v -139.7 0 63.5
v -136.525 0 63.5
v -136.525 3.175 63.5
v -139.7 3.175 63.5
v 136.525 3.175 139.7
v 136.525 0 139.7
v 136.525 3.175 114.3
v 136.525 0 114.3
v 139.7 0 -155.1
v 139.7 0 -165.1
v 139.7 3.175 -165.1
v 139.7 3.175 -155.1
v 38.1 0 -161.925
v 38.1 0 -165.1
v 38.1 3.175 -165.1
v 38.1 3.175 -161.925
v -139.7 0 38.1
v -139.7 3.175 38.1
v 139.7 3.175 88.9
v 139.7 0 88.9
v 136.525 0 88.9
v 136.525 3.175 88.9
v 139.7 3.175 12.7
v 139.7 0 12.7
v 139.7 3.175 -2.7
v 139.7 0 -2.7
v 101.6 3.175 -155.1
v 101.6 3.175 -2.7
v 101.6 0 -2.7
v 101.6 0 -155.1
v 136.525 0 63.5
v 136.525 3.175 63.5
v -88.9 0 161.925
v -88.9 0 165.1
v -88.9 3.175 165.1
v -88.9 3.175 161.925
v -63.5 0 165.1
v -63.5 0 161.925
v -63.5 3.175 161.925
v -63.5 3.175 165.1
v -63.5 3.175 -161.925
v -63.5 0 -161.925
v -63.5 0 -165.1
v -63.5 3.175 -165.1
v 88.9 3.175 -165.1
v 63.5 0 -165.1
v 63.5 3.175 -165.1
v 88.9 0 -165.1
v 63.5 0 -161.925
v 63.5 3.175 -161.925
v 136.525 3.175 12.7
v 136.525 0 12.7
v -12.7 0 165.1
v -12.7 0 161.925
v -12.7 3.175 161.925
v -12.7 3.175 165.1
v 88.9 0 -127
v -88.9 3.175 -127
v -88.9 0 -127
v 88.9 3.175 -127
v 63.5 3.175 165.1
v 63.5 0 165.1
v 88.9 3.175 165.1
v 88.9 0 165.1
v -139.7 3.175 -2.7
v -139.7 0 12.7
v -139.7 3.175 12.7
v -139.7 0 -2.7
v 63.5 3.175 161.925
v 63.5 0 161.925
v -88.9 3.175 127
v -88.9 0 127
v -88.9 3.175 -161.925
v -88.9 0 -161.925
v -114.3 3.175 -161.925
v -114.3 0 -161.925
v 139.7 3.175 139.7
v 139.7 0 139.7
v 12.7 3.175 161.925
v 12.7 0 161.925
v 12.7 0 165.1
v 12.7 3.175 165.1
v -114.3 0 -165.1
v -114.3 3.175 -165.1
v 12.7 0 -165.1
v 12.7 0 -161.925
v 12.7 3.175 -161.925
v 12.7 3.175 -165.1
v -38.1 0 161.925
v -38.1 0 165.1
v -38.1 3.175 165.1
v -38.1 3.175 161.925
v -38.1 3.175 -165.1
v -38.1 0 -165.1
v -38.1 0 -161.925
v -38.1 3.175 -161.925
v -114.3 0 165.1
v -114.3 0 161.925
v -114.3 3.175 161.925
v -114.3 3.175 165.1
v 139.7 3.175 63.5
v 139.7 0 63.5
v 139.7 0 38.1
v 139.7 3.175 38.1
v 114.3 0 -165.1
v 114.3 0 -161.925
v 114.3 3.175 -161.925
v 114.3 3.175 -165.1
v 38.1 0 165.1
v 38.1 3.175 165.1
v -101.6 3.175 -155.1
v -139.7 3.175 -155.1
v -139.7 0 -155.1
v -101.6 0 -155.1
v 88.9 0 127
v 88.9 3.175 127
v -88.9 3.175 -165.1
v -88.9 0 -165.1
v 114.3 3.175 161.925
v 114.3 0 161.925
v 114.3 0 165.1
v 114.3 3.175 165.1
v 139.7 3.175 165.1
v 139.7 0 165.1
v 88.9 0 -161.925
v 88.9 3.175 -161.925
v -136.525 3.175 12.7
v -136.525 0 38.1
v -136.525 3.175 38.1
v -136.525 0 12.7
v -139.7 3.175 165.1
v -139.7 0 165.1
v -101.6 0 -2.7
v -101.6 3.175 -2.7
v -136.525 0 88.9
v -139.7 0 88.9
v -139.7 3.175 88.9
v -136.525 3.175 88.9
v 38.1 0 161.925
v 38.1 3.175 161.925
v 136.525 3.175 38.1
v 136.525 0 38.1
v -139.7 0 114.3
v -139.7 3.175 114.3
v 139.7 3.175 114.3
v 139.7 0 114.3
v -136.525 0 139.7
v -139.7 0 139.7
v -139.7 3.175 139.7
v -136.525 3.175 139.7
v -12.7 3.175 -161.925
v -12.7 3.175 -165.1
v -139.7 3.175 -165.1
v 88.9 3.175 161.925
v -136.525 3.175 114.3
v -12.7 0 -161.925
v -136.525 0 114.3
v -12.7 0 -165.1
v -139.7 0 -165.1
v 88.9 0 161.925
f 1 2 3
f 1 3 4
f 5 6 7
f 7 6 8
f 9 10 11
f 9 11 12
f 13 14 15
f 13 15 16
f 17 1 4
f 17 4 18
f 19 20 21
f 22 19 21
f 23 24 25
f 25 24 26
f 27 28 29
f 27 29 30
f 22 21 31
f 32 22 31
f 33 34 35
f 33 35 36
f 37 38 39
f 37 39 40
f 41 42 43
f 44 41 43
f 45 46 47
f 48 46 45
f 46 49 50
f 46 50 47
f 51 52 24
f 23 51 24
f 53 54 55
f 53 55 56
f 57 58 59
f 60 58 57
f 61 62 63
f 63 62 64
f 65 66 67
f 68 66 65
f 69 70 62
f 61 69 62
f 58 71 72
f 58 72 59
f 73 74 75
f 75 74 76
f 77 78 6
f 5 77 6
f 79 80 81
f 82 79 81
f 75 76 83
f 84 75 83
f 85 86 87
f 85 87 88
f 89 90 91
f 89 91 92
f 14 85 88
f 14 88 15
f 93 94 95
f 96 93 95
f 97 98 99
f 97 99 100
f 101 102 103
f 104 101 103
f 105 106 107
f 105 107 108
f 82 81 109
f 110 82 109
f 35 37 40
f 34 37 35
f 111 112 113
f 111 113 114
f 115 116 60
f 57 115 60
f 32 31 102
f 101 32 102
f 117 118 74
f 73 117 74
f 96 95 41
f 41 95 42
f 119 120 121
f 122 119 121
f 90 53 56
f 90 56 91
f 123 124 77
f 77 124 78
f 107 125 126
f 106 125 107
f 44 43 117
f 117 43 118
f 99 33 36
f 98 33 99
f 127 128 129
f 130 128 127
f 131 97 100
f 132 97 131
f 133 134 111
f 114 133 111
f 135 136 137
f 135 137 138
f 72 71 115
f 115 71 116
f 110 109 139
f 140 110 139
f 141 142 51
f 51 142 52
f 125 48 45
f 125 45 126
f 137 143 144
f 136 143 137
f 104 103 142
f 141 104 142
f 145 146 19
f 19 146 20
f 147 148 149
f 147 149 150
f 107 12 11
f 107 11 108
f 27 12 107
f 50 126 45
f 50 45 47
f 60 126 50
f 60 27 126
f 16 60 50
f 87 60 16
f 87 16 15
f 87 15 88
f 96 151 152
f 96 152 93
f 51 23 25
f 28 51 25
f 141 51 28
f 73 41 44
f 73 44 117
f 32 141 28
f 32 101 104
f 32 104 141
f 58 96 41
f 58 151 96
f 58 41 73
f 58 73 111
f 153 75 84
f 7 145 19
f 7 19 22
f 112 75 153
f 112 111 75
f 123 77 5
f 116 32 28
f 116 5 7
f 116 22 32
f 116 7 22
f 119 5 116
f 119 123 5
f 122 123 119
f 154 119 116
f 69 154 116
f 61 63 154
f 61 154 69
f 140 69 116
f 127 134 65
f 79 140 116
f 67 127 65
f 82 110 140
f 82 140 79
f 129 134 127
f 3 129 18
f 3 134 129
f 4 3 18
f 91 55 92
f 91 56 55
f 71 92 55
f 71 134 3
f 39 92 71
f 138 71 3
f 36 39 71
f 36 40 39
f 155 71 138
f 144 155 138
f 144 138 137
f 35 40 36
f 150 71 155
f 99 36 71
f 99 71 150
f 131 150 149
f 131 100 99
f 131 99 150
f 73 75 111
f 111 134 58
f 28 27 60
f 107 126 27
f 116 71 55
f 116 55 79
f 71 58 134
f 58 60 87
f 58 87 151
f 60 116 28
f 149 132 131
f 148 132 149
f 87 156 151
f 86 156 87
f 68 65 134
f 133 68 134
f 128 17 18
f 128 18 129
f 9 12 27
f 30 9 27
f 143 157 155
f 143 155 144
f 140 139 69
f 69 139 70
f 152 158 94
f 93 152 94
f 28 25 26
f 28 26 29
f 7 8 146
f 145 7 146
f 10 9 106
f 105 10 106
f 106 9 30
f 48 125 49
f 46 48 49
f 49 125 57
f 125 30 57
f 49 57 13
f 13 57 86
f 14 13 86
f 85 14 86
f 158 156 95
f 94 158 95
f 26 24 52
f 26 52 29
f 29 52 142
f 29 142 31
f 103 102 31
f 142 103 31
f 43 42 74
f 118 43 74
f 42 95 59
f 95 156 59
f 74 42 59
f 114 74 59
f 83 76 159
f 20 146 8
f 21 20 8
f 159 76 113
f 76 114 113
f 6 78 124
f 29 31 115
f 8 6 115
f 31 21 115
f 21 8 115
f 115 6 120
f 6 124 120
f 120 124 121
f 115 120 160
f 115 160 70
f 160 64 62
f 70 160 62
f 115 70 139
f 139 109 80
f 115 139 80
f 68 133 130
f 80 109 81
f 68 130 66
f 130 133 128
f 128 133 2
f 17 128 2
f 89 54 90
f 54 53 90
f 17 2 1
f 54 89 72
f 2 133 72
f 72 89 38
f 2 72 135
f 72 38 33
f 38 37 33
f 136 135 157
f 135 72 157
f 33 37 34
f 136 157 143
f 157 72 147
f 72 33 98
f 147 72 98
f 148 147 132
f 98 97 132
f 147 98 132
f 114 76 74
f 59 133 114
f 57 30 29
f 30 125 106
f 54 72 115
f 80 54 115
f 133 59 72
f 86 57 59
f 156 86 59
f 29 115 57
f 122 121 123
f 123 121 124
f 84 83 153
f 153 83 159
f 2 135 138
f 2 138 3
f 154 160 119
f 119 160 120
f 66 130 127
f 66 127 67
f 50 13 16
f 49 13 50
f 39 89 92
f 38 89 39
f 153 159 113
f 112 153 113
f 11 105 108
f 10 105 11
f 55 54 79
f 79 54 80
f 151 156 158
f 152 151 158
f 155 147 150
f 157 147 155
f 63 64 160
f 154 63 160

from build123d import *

# Parameters (mm, degrees)
BOSS_EXTRUDE1_DEPTH     = 3.175
SKETCH4_W               = 38.1
SKETCH4_H               = 152.4
CUT_EXTRUDE2_DEPTH      = 1
CUT_EXTRUDE2_DEPTH_BACK = 4.175
SKETCH2_W               = 177.8
SKETCH2_H               = 254
CUT_EXTRUDE1_DEPTH      = 1
CUT_EXTRUDE1_DEPTH_BACK = 4.175


with BuildPart() as part:
    # Sketch1 → Boss-Extrude1 (new body)
    with BuildSketch(Plane(origin=(0, 0, 0), x_dir=(1, 0, 0), z_dir=(0, 1, 0))):
        Polygon((-139.7, 0), (0, 0), (0, 161.925), (-12.7, 161.925), (-12.7, 165.1), (-38.1, 165.1), (-38.1, 161.925), (-63.5, 161.925), (-63.5, 165.1), (-88.9, 165.1), (-88.9, 161.925), (-114.3, 161.925), (-114.3, 165.1), (-139.7, 165.1), (-139.7, 139.7), (-136.525, 139.7), (-136.525, 114.3), (-139.7, 114.3), (-139.7, 88.9), (-136.525, 88.9), (-136.525, 63.5), (-139.7, 63.5), (-139.7, 38.1), (-136.525, 38.1), (-136.525, 12.7), (-139.7, 12.7), align=None)
    extrude(amount=BOSS_EXTRUDE1_DEPTH)

    # Mirror1: part across plane


with BuildPart() as part_1:
    add(part.part)
    add(part.part.mirror(Plane(origin=(-139.7, 3.175, 0), x_dir=(1, 0, 0), z_dir=(0, 0, -1))))

    # Sketch4 → Cut-Extrude2 (cut, two sides)
    with BuildSketch(Plane(origin=(0, 3.175, 0), x_dir=(1, 0, 0), z_dir=(0, 1, 0))) as cut_extrude2_sk:
        with Locations((-120.65, 78.9)):
            Rectangle(SKETCH4_W, SKETCH4_H)
    extrude(amount=CUT_EXTRUDE2_DEPTH, mode=Mode.SUBTRACT)
    extrude(cut_extrude2_sk.sketch, amount=-CUT_EXTRUDE2_DEPTH_BACK, mode=Mode.SUBTRACT)

    # Mirror2: part across plane


with BuildPart() as part_2:
    add(part_1.part)
    add(part_1.part.mirror(Plane(origin=(0, 3.175, 0), x_dir=(0, 0, 1), z_dir=(-1, 0, 0))))

    # Sketch2 → Cut-Extrude1 (cut, two sides)
    with BuildSketch(Plane(origin=(0, 3.175, 0), x_dir=(1, 0, 0), z_dir=(0, 1, 0))) as cut_extrude1_sk:
        Rectangle(SKETCH2_W, SKETCH2_H)
    extrude(amount=CUT_EXTRUDE1_DEPTH, mode=Mode.SUBTRACT)
    extrude(cut_extrude1_sk.sketch, amount=-CUT_EXTRUDE1_DEPTH_BACK, mode=Mode.SUBTRACT)


solid = part_2.part
